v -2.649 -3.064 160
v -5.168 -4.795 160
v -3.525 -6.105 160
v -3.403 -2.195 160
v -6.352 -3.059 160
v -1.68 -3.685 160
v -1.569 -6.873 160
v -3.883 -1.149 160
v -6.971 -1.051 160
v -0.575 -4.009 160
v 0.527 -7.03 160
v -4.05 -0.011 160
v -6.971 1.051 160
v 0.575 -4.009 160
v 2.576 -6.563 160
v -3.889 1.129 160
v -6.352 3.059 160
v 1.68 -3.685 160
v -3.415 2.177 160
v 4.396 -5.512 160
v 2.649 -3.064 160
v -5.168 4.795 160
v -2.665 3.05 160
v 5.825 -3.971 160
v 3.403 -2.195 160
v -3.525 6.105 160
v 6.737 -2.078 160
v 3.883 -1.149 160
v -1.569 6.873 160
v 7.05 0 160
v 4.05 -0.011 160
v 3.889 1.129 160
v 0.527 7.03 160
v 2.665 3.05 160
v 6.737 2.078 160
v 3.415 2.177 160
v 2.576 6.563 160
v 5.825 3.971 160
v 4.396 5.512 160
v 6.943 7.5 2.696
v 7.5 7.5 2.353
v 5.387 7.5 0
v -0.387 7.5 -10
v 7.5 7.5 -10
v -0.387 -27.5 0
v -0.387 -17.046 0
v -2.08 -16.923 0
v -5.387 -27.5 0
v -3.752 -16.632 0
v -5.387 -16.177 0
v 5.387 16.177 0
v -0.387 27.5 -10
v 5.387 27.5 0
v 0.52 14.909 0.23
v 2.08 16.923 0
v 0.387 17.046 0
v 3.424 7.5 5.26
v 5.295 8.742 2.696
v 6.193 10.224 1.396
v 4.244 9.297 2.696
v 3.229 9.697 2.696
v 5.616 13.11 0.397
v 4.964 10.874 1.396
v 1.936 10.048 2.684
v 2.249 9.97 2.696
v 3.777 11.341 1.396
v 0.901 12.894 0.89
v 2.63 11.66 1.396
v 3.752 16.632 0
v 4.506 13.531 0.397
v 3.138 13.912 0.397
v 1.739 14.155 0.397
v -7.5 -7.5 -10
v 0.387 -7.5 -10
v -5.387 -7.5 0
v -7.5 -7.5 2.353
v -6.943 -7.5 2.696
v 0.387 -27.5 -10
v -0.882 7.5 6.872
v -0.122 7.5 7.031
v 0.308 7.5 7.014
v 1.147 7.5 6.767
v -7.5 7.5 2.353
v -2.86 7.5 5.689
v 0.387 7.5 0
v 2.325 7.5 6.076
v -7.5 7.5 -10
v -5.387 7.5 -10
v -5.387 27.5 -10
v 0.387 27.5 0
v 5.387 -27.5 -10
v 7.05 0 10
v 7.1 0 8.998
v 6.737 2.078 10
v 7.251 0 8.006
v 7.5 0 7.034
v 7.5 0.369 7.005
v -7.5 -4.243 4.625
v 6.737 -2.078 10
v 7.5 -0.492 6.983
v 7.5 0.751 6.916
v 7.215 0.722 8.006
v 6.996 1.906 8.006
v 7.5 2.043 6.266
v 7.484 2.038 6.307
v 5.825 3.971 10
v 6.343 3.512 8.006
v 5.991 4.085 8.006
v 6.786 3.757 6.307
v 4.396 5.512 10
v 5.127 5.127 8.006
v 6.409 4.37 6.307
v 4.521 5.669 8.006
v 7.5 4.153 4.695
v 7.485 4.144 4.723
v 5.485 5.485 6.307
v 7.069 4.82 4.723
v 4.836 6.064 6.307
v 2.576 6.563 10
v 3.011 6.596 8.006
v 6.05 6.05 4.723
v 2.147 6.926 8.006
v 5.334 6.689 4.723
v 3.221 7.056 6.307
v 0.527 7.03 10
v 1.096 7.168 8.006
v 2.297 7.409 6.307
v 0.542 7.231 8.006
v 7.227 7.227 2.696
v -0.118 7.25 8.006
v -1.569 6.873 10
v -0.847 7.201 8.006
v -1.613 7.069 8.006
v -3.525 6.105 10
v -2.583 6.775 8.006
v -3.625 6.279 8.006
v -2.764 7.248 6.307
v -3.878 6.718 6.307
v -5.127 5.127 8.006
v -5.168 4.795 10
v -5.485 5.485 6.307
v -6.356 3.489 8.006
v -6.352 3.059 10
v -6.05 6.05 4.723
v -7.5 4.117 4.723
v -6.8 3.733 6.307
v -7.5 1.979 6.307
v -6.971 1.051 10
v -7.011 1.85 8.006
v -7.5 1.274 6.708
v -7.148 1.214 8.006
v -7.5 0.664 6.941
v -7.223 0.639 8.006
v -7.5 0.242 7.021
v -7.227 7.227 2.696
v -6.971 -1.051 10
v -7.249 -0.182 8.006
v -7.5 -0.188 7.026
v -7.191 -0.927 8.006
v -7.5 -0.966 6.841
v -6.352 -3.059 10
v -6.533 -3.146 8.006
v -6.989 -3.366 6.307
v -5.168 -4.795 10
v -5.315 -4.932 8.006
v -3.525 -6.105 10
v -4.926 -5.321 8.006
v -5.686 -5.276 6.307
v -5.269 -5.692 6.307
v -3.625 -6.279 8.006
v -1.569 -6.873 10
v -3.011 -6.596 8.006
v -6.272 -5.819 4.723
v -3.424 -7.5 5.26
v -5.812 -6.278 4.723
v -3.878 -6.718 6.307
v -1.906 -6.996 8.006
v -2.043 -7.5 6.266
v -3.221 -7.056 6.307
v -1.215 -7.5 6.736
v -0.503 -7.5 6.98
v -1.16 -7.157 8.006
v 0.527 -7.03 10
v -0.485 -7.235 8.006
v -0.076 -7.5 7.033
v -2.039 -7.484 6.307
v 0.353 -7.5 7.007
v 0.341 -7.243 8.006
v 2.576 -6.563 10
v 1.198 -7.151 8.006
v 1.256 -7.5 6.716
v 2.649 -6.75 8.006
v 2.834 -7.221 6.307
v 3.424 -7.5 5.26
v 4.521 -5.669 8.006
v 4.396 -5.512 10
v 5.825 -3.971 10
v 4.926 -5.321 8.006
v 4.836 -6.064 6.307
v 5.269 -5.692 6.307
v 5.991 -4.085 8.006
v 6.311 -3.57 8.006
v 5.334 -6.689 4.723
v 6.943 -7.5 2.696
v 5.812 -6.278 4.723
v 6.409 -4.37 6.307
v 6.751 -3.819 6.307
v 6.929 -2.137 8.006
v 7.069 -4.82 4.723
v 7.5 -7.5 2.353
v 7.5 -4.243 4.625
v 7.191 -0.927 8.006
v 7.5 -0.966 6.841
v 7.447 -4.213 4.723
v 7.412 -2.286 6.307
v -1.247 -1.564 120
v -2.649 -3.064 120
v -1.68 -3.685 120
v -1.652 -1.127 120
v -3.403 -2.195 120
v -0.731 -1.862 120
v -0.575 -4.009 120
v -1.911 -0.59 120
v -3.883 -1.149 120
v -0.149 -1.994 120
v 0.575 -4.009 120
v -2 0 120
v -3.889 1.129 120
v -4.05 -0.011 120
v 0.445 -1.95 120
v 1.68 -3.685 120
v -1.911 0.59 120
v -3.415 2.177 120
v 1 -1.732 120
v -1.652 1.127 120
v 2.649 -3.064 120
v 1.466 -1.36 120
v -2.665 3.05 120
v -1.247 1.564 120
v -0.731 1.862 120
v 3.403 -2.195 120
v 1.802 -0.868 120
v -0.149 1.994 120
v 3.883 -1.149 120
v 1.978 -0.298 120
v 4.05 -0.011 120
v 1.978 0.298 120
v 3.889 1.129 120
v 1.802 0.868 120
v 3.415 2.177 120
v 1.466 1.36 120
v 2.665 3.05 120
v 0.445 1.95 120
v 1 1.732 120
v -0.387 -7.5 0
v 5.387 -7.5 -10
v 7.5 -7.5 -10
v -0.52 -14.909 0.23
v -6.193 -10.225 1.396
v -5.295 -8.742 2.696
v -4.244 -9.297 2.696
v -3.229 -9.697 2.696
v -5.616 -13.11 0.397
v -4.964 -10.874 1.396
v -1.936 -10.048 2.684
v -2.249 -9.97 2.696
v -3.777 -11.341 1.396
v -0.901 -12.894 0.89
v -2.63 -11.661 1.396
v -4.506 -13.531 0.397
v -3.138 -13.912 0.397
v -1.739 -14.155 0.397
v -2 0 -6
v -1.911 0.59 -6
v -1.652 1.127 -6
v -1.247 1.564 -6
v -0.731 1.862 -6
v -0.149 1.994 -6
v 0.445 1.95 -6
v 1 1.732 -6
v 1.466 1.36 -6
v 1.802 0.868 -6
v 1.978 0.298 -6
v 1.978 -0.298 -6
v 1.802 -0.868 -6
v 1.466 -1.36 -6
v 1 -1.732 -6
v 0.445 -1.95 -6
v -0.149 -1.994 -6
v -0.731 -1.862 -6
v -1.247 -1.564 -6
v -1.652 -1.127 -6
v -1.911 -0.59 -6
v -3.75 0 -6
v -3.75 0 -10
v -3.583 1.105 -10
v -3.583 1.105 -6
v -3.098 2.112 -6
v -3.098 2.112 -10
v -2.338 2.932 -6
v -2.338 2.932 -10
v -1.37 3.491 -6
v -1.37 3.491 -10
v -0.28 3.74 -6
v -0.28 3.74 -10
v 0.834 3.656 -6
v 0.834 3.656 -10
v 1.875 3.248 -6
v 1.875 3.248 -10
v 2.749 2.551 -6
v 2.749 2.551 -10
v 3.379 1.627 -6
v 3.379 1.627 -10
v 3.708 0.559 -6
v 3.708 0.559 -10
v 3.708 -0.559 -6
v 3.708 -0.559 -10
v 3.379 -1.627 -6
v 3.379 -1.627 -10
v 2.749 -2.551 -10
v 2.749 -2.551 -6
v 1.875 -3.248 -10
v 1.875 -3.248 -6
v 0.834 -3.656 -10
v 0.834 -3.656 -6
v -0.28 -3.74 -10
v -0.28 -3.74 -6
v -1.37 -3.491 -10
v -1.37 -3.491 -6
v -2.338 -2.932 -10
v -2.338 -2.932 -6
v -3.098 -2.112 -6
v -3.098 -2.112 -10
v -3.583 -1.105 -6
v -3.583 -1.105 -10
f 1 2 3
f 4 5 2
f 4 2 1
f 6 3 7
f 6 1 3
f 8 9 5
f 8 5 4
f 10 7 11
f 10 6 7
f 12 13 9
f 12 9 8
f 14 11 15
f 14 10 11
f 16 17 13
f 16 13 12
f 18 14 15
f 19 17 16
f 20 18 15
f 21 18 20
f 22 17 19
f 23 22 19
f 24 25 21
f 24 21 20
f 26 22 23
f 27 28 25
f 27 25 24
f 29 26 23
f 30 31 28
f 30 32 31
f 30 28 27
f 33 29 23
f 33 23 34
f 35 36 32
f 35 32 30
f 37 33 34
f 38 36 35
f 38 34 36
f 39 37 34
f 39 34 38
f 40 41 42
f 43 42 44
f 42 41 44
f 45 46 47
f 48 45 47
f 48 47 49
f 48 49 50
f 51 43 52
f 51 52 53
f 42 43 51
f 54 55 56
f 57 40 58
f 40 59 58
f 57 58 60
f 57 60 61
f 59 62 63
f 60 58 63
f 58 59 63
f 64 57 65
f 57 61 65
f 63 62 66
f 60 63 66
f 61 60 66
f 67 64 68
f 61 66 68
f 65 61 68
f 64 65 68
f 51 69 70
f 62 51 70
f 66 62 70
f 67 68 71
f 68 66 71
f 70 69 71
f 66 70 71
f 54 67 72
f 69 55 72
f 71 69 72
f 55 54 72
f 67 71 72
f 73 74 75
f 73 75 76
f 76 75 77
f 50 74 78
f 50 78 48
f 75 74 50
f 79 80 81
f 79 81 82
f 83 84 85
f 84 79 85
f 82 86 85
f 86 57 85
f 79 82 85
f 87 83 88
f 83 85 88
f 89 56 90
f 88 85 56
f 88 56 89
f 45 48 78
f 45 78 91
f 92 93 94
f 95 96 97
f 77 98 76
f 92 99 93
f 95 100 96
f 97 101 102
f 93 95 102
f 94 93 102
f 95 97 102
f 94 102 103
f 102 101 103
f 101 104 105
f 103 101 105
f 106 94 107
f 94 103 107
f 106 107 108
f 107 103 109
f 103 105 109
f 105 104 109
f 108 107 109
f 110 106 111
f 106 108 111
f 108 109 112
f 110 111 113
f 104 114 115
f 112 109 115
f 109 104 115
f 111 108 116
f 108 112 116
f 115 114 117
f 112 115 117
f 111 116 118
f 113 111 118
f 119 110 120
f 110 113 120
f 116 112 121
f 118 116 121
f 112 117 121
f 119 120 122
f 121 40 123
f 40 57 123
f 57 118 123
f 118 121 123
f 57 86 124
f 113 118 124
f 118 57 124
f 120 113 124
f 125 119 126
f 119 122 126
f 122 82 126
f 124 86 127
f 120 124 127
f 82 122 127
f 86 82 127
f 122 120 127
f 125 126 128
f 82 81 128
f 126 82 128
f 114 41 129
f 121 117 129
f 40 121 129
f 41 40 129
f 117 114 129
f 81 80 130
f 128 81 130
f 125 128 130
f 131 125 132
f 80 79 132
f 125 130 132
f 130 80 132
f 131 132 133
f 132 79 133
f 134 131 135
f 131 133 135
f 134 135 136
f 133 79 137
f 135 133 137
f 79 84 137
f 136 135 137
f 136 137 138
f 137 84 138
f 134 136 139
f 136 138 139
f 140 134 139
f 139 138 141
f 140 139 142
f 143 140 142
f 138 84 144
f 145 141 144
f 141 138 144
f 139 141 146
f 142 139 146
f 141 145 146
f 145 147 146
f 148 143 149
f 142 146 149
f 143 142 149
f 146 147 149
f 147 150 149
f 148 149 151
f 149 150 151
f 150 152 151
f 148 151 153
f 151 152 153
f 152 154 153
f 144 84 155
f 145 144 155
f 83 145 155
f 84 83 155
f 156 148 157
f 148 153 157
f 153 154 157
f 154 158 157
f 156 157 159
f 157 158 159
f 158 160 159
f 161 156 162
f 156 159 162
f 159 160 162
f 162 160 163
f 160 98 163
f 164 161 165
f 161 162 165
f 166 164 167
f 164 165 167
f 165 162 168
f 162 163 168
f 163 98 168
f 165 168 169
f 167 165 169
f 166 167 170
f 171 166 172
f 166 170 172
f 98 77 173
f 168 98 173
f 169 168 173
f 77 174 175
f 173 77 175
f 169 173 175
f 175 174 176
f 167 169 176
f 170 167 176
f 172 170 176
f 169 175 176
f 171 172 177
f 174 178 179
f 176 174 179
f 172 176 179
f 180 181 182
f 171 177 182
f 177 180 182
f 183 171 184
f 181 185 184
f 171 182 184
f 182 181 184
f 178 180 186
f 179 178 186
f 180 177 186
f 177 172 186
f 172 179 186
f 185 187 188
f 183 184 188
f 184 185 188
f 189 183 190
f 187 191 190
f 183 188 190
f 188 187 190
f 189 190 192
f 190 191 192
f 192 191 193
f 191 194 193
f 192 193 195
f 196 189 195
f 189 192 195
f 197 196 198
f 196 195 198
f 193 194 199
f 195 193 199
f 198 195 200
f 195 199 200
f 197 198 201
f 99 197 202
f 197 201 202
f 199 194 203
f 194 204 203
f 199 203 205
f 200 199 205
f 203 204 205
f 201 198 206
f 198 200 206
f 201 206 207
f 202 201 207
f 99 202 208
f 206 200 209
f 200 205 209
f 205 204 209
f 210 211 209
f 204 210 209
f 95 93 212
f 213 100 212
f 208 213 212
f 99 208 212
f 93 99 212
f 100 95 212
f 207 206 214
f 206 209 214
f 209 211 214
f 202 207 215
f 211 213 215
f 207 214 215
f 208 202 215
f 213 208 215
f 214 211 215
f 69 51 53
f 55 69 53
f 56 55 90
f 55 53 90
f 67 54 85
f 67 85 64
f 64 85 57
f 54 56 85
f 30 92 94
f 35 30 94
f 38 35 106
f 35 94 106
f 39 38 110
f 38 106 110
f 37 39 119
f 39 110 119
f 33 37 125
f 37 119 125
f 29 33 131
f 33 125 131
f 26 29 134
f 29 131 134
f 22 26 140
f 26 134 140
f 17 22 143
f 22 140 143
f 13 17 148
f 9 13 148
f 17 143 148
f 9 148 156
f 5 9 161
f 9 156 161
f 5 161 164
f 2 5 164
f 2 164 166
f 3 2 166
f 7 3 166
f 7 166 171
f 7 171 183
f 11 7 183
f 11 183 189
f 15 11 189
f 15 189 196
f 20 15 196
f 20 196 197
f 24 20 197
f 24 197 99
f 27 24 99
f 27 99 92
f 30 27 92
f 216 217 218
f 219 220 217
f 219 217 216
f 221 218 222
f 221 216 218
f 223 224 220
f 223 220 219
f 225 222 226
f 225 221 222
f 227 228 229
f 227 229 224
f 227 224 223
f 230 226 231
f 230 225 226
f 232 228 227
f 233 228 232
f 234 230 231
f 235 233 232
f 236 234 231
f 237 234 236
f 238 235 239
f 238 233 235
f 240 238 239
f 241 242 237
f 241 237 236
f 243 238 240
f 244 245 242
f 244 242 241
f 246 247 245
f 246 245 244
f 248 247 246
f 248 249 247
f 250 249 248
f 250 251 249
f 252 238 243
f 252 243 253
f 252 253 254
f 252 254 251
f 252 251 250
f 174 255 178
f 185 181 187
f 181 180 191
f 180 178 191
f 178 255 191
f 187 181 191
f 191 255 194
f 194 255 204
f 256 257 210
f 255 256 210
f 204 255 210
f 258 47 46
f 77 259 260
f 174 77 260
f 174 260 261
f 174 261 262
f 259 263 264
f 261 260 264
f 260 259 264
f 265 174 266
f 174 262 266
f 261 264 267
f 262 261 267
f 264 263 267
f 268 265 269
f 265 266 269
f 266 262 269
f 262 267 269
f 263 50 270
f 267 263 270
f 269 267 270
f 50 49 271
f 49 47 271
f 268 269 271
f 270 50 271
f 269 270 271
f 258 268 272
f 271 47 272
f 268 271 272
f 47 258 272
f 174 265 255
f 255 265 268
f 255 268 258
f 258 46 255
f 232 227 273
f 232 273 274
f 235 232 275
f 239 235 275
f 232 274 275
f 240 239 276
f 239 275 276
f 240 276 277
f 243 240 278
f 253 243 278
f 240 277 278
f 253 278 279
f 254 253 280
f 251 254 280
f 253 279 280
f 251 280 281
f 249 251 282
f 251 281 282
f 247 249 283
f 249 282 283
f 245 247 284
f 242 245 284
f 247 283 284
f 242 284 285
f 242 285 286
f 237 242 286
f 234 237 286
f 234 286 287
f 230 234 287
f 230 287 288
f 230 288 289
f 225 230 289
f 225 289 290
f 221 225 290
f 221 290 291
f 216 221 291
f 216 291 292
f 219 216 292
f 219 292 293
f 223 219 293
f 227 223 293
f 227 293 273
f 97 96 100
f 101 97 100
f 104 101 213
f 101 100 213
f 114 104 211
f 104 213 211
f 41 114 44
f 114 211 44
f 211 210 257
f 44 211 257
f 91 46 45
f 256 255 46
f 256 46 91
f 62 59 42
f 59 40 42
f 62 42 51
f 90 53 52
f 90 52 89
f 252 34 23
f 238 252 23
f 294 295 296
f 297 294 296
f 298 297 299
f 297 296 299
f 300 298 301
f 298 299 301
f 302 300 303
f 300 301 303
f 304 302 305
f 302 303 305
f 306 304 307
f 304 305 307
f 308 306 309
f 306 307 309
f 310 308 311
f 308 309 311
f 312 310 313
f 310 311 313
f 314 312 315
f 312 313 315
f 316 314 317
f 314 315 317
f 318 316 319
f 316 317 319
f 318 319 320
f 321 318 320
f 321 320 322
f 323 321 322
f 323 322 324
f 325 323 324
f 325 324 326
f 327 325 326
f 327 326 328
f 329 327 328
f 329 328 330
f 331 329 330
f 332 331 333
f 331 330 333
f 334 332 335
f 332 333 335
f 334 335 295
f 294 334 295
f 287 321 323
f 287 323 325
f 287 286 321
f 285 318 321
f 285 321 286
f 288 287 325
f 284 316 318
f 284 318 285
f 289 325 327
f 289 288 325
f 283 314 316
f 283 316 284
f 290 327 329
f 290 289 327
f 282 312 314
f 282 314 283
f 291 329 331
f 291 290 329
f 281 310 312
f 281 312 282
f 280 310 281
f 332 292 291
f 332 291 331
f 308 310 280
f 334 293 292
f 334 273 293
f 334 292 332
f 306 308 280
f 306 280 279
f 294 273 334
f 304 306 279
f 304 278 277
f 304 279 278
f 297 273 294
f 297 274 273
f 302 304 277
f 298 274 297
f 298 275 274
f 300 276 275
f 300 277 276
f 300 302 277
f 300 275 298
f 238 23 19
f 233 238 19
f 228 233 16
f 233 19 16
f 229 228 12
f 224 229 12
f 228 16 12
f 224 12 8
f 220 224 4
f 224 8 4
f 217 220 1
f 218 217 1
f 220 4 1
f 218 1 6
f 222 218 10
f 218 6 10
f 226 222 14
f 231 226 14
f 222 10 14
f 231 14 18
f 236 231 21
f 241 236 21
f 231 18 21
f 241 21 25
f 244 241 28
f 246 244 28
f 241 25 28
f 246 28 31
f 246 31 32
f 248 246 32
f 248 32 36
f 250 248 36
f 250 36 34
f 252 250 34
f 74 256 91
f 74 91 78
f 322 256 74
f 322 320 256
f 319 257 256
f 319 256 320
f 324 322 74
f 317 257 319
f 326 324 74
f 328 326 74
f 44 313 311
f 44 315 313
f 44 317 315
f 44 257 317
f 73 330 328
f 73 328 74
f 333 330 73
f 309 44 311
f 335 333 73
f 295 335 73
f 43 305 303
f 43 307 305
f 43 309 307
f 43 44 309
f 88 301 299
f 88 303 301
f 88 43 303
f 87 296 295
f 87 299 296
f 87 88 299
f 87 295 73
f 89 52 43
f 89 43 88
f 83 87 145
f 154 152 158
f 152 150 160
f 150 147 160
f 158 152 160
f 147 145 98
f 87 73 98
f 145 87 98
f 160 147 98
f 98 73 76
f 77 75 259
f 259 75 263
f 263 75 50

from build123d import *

# Parameters (mm, degrees)
SKETCH1_R           = 7.05
SKETCH1_R_2         = 4.05
BOSS_EXTRUDE1_DEPTH = 160
SKETCH3_W           = 15
SKETCH3_H           = 15
BOSS_EXTRUDE2_DEPTH = 10
BOSS_EXTRUDE3_DEPTH = 20
CIRPATTERN1_COUNT   = 2
FILLET1_R           = 10
CUT_EXTRUDE2_DEPTH  = 40
SKETCH6_R           = 2
CUT_EXTRUDE3_DEPTH  = 173.37314178
SKETCH7_R           = 3.75
CUT_EXTRUDE4_DEPTH  = 4


with BuildPart() as part:
    # Sketch1 → Boss-Extrude1 (new body)
    # profile 1 of 2: a face of its own
    with BuildSketch(Plane.XY):
        Circle(SKETCH1_R)
        Circle(SKETCH1_R_2, mode=Mode.SUBTRACT)
    # profile 2 of 2: a face of its own
    with BuildSketch(Plane.XY):
        Circle(SKETCH1_R_2)
    extrude(amount=BOSS_EXTRUDE1_DEPTH)

    # Sketch3 → Boss-Extrude2 (add)
    with BuildSketch(Plane(origin=(0, 0, 0), x_dir=(-1, 0, 0), z_dir=(0, 0, -1))):
        Rectangle(SKETCH3_W, SKETCH3_H)
    extrude(amount=BOSS_EXTRUDE2_DEPTH)

    # Sketch4 → Boss-Extrude3 (add)
    with BuildSketch(Plane(origin=(0, 7.5, 0), x_dir=(1, 0, 0), z_dir=(0, 1, 0))):
        Polygon((-0.386751346, 10), (5.386751346, 0), (0.386751346, 0), (-5.386751346, 10), align=None)
    boss_extrude3 = extrude(amount=BOSS_EXTRUDE3_DEPTH)

    # CirPattern1: Boss-Extrude3 ×2 about axis
    cirpattern1_axis = Axis((0, 0, 0), (0, 0, 1))
    for i in range(1, CIRPATTERN1_COUNT):
        add(boss_extrude3.rotate(cirpattern1_axis, i * 360 / CIRPATTERN1_COUNT))

    # Fillet1
    # the kernel refuses this fillet: 10 mm, written as the material it adds along each edge
    with BuildSketch(Plane(origin=(0, 0, 0), x_dir=(1, 0, 0), z_dir=(0, -1, 0))) as fillet1_piece_1_section:
        with BuildLine():
            CenterArc((7.05 + FILLET1_R, FILLET1_R), FILLET1_R, 180, 90)
            Line((7.05, FILLET1_R), (7.05, 0))
            Line((7.05, 0), (7.05 + FILLET1_R, 0))
        make_face()
    fillet1_piece_1 = revolve(axis=Axis((0, 0, 0), (0, 0, 1)), mode=Mode.PRIVATE)
    fillet1_piece_1 = split(fillet1_piece_1, bisect_by=Plane(origin=(7.384958352, 7.5, 2.9516764), z_dir=(0, -1, 0)), keep=Keep.TOP, mode=Mode.PRIVATE)
    fillet1_piece_1 = split(fillet1_piece_1, bisect_by=Plane(origin=(7.5, 6.602416729, 2.9516764), z_dir=(-1, 0, 0)), keep=Keep.TOP, mode=Mode.PRIVATE)
    fillet1_piece_1 = split(fillet1_piece_1, bisect_by=Plane(origin=(-7.5, 6.602416729, 2.9516764), z_dir=(1, 0, 0)), keep=Keep.TOP, mode=Mode.PRIVATE)
    fillet1_piece_1 = split(fillet1_piece_1, bisect_by=Plane(origin=(7.384958352, -7.5, 2.9516764), z_dir=(0, 1, 0)), keep=Keep.TOP, mode=Mode.PRIVATE)
    add(fillet1_piece_1)
    with BuildSketch(Plane(origin=(0, 0, 0), x_dir=(1, 0, 0), z_dir=(0, -1, 0))) as fillet1_piece_2_section:
        with BuildLine():
            CenterArc((7.05 + FILLET1_R, FILLET1_R), FILLET1_R, 180, 90)
            Line((7.05, FILLET1_R), (7.05, 0))
            Line((7.05, 0), (7.05 + FILLET1_R, 0))
        make_face()
    fillet1_piece_2 = revolve(axis=Axis((0, 0, 0), (0, 0, 1)), mode=Mode.PRIVATE)
    fillet1_piece_2 = split(fillet1_piece_2, bisect_by=Plane(origin=(5.410380514, 9.830478865, 0.040926919), z_dir=(-0.8660254037844362, 0, 0.5000000000000043)), keep=Keep.TOP, mode=Mode.PRIVATE)
    fillet1_piece_2 = split(fillet1_piece_2, bisect_by=Plane(origin=(7.5, 9.830478865, 1.235681154), z_dir=(-1, 0, 0)), keep=Keep.TOP, mode=Mode.PRIVATE)
    fillet1_piece_2 = split(fillet1_piece_2, bisect_by=Plane(origin=(1.660380514, 9.830478865, 2.205990428), z_dir=(0.8660254037844359, 0, -0.5000000000000047)), keep=Keep.TOP, mode=Mode.PRIVATE)
    fillet1_piece_2 = split(fillet1_piece_2, bisect_by=Plane(origin=(3.341005476, -7.5, 1.235681154), z_dir=(0, 1, 0)), keep=Keep.TOP, mode=Mode.PRIVATE)
    add(fillet1_piece_2)
    with BuildSketch(Plane(origin=(0, 0, 0), x_dir=(1, 0, 0), z_dir=(0, -1, 0))) as fillet1_piece_3_section:
        with BuildLine():
            CenterArc((7.05 + FILLET1_R, FILLET1_R), FILLET1_R, 180, 90)
            Line((7.05, FILLET1_R), (7.05, 0))
            Line((7.05, 0), (7.05 + FILLET1_R, 0))
        make_face()
    fillet1_piece_3 = revolve(axis=Axis((0, 0, 0), (0, 0, 1)), mode=Mode.PRIVATE)
    fillet1_piece_3 = split(fillet1_piece_3, bisect_by=Plane(origin=(-3.341005467, -7.5, 1.235681156), z_dir=(0, -1, 0)), keep=Keep.TOP, mode=Mode.PRIVATE)
    fillet1_piece_3 = split(fillet1_piece_3, bisect_by=Plane(origin=(-5.410380512, -9.830478864, 0.040926917), z_dir=(0.8660254037844362, 0, 0.5000000000000043)), keep=Keep.TOP, mode=Mode.PRIVATE)
    fillet1_piece_3 = split(fillet1_piece_3, bisect_by=Plane(origin=(-1.660380512, -9.830478864, 2.205990426), z_dir=(-0.8660254037844359, 0, -0.5000000000000047)), keep=Keep.TOP, mode=Mode.PRIVATE)
    add(fillet1_piece_3)

    # Sketch5 → Cut-Extrude2 (cut)
    with BuildSketch(Plane.XY.offset(160)):
        with BuildLine():
            Line((2.664582519, 3.05), (-2.664582519, 3.05))
            ThreePointArc((-2.664582519, 3.05), (0, -4.05), (2.664582519, 3.05))
        make_face()
    extrude(amount=-CUT_EXTRUDE2_DEPTH, mode=Mode.SUBTRACT)

    # Sketch6 → Cut-Extrude3 (cut, through all)
    with BuildSketch(Plane(origin=(0, 0, -10), x_dir=(-1, 0, 0), z_dir=(0, 0, -1))):
        Circle(SKETCH6_R)
    extrude(amount=-CUT_EXTRUDE3_DEPTH, mode=Mode.SUBTRACT)

    # Sketch7 → Cut-Extrude4 (cut)
    with BuildSketch(Plane(origin=(0, 0, -10), x_dir=(-1, 0, 0), z_dir=(0, 0, -1))):
        Circle(SKETCH7_R)
    extrude(amount=-CUT_EXTRUDE4_DEPTH, mode=Mode.SUBTRACT)


solid = part.part
